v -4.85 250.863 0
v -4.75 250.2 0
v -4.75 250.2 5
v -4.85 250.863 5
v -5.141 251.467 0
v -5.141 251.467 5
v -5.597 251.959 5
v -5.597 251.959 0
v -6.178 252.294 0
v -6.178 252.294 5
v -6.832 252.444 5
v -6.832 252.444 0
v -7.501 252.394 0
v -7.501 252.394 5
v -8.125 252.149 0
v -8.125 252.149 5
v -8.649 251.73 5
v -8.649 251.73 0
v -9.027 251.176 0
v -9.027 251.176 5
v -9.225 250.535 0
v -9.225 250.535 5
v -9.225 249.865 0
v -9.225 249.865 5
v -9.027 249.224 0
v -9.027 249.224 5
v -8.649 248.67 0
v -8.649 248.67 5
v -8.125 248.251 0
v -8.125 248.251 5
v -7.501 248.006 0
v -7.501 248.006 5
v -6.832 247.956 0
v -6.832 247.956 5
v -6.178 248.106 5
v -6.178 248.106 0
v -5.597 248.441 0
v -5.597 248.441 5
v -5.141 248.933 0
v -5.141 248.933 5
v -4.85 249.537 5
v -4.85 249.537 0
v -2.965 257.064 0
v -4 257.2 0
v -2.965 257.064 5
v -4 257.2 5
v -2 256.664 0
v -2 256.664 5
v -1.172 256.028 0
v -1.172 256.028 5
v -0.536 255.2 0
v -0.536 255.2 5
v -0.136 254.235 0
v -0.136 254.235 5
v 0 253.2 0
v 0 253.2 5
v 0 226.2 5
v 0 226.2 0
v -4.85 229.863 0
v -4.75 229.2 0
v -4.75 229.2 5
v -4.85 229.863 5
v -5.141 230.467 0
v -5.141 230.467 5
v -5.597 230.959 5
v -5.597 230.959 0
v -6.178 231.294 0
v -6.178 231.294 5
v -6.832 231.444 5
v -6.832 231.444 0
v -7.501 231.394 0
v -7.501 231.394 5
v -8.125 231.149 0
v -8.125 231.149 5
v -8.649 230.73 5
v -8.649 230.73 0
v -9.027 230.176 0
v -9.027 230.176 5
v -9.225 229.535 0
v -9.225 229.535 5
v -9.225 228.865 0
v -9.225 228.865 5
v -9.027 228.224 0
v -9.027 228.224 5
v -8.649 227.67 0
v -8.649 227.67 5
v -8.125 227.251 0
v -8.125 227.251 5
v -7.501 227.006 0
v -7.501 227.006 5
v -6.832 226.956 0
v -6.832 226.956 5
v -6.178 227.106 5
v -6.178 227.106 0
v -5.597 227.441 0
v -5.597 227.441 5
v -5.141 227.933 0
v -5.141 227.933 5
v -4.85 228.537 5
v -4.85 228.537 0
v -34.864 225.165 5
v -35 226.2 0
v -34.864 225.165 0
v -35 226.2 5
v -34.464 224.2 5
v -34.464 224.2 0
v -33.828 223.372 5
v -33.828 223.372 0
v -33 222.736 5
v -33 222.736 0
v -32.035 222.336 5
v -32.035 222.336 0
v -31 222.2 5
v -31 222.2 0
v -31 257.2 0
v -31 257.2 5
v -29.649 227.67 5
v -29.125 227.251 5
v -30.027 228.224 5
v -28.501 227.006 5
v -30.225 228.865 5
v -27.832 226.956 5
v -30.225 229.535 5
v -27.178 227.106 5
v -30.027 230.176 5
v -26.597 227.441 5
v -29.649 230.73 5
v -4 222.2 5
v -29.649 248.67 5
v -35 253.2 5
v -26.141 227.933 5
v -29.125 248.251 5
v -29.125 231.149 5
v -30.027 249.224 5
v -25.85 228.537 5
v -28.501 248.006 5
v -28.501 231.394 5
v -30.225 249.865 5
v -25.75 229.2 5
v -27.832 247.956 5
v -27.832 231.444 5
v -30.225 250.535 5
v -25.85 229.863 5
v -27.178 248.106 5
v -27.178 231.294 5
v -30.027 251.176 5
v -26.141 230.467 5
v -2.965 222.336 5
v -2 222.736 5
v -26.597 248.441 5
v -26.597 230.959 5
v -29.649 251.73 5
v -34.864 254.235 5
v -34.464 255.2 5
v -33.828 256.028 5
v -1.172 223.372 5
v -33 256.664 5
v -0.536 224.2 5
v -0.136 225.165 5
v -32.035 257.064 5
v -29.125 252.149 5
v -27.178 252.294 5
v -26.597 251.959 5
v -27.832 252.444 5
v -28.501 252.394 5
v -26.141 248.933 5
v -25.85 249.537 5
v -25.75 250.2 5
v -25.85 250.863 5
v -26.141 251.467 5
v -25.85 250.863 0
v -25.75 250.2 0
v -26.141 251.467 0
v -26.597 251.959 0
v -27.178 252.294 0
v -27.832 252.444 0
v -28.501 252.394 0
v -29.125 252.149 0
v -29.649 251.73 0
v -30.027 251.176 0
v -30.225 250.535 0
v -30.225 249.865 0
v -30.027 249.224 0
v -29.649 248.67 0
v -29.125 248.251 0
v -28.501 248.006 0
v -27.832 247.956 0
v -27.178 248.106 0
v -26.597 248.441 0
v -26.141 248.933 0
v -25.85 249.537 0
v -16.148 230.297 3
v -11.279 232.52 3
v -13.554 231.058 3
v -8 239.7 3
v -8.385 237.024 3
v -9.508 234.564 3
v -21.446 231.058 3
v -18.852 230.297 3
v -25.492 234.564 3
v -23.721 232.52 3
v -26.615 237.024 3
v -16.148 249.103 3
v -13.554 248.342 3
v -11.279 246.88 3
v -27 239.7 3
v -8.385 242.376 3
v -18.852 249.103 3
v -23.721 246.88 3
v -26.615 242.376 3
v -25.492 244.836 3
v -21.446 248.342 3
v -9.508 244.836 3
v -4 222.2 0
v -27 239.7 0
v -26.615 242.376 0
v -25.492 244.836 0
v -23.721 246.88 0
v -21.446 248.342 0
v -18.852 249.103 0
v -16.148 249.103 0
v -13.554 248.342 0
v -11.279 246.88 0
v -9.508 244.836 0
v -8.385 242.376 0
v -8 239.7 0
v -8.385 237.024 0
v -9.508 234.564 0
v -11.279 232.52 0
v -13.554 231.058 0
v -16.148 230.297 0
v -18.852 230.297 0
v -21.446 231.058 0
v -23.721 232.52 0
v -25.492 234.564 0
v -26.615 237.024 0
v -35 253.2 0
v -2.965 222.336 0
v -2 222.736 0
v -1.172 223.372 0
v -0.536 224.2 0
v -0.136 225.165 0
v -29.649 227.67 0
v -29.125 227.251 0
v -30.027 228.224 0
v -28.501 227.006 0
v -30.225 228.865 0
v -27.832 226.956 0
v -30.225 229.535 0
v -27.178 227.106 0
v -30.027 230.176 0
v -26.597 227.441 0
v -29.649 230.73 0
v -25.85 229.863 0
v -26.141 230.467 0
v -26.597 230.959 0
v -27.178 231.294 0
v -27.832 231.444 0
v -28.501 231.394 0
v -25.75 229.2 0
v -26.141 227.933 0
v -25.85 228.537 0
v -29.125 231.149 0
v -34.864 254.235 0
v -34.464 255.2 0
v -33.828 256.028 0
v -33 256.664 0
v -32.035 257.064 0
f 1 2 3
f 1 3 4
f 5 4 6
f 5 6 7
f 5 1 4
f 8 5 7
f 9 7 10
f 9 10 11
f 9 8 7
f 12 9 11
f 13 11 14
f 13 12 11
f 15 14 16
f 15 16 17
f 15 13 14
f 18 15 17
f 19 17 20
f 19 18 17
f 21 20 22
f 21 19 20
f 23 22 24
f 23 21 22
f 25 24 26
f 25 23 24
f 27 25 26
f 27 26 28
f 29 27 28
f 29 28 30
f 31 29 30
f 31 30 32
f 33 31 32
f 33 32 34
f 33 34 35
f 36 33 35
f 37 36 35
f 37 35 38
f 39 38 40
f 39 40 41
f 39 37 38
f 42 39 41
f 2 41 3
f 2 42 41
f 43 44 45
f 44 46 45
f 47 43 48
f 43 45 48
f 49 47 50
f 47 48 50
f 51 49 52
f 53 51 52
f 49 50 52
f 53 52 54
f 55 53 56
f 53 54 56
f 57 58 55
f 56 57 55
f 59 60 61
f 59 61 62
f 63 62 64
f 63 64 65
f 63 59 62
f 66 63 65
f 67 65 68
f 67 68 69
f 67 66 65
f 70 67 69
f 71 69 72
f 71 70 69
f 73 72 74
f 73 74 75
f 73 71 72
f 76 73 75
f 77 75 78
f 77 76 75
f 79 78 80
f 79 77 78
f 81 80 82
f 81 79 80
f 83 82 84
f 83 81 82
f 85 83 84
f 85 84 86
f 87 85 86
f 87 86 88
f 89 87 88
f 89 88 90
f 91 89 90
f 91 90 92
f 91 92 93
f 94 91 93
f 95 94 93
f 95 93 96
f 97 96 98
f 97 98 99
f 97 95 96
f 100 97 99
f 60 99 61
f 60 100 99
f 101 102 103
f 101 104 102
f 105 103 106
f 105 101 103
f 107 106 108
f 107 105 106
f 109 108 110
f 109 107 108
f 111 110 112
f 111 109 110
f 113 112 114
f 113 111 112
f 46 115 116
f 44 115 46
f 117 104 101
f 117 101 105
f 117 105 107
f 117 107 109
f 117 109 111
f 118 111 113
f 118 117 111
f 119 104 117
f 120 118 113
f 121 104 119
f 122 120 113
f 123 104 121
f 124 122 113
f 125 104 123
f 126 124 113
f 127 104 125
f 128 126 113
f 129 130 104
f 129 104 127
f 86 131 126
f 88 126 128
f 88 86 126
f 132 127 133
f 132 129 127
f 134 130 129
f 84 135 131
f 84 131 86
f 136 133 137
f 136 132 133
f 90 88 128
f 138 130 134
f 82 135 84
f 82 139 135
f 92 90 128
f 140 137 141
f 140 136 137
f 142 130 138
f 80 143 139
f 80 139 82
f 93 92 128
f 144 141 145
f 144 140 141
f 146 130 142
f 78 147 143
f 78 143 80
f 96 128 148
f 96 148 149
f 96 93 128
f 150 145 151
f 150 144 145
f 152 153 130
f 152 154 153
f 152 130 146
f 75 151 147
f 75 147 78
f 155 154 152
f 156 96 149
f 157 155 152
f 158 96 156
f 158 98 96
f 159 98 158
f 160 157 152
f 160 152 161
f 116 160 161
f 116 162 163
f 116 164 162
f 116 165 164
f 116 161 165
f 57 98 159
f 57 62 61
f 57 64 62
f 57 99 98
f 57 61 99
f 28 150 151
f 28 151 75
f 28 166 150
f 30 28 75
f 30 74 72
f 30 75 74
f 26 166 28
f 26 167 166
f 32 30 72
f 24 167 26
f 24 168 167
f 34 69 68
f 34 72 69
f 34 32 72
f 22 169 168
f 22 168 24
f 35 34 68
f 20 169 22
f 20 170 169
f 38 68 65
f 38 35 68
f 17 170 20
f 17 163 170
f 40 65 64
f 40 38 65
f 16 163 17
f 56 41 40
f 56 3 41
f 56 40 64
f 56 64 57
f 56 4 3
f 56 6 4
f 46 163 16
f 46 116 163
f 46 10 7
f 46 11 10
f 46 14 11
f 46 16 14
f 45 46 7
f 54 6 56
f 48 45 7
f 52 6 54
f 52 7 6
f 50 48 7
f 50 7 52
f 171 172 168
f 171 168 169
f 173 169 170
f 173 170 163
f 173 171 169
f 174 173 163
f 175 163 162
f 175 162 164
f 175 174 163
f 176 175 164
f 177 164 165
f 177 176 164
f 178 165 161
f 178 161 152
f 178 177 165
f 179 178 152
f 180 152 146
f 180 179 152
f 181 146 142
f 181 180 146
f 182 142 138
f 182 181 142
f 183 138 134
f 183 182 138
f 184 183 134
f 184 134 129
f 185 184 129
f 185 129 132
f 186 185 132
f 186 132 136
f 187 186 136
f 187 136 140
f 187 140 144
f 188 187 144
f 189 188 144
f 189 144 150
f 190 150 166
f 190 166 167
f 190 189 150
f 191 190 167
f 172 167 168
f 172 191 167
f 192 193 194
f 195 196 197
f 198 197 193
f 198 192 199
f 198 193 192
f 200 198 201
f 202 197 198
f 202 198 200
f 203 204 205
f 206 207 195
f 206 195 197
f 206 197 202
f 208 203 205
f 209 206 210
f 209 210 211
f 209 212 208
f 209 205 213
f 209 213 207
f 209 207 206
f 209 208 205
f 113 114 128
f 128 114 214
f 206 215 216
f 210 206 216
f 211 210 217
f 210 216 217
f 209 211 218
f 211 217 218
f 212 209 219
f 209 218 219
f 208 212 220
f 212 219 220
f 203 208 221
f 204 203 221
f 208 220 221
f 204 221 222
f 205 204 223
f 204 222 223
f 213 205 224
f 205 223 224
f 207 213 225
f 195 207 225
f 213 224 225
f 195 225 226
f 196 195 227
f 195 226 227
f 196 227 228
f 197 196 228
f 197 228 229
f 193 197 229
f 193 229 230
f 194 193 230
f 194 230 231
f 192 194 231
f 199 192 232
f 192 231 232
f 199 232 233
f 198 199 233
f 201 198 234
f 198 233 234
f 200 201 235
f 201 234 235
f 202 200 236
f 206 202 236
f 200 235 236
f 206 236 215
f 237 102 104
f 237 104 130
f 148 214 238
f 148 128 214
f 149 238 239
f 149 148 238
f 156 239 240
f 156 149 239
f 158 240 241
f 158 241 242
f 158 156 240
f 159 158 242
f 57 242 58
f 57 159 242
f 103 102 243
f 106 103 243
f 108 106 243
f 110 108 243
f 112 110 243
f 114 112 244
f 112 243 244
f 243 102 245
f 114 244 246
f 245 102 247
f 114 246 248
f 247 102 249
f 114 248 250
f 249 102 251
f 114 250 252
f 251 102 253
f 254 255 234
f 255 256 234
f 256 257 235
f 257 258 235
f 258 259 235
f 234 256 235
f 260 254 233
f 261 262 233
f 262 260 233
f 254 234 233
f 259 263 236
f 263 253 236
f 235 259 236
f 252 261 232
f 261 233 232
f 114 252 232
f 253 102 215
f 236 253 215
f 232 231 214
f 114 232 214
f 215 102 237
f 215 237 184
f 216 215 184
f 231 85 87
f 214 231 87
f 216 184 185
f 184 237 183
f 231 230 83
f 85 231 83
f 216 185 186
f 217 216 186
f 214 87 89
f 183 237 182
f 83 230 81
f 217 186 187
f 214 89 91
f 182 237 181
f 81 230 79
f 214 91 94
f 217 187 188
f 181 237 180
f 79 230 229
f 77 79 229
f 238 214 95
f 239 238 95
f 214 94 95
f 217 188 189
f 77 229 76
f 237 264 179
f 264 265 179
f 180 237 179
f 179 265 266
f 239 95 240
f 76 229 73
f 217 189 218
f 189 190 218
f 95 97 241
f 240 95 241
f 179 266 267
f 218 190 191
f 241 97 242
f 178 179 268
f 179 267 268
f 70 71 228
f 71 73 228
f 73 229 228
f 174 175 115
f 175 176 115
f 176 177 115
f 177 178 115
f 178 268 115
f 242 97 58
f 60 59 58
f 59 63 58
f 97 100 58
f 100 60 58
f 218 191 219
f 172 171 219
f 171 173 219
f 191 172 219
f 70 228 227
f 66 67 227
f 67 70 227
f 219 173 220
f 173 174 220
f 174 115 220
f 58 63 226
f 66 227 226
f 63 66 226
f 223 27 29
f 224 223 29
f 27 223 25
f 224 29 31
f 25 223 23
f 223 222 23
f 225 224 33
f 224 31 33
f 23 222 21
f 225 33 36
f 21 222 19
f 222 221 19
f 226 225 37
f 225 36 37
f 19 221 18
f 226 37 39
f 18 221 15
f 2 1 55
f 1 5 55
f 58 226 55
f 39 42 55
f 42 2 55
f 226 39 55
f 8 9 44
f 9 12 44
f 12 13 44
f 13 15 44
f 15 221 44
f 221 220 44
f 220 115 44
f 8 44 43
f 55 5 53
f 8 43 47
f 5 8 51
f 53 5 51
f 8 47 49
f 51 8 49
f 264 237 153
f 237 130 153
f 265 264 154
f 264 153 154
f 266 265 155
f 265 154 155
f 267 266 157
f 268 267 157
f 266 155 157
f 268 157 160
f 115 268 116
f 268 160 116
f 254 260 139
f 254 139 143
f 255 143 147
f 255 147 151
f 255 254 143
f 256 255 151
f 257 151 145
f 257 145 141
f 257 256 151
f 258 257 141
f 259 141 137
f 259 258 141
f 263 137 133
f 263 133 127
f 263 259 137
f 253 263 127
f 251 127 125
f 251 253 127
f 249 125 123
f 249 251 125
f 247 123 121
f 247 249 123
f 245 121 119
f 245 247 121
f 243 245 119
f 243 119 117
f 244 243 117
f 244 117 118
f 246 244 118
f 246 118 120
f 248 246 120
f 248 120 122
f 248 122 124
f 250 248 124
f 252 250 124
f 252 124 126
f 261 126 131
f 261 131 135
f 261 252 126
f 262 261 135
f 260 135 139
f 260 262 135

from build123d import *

# Parameters (mm, degrees)
SKETCH1_W           = 35
SKETCH1_H           = 35
SKETCH1_R           = 2.25
BOSS_EXTRUDE1_DEPTH = 5
FILLET1_R           = 4
SKETCH2_R           = 9.5
CUT_EXTRUDE1_DEPTH  = 3


with BuildPart() as part:
    # Sketch1 → Boss-Extrude1 (new body)
    with BuildSketch(Plane.XY):
        with Locations((-17.5, 239.7)):
            Rectangle(SKETCH1_W, SKETCH1_H)
        with Locations((-7, 250.2)):
            Circle(SKETCH1_R, mode=Mode.SUBTRACT)
        with Locations((-7, 229.2)):
            Circle(SKETCH1_R, mode=Mode.SUBTRACT)
        with Locations((-28, 229.2)):
            Circle(SKETCH1_R, mode=Mode.SUBTRACT)
        with Locations((-28, 250.2)):
            Circle(SKETCH1_R, mode=Mode.SUBTRACT)
    extrude(amount=BOSS_EXTRUDE1_DEPTH)

    # Fillet1
    fillet1_edges = [part.edges().sort_by_distance(p)[0] for p in [
        (0, 222.2, 2.5),
        (-35, 222.2, 2.5),
        (-35, 257.2, 2.5),
        (0, 257.2, 2.5),
    ]]
    fillet(fillet1_edges, radius=FILLET1_R)

    # Sketch2 → Cut-Extrude1 (cut)
    with BuildSketch(Plane(origin=(0, 0, 0), x_dir=(-1, 0, 0), z_dir=(0, 0, -1))):
        with Locations((17.5, 239.7)):
            Circle(SKETCH2_R)
    extrude(amount=-CUT_EXTRUDE1_DEPTH, mode=Mode.SUBTRACT)


solid = part.part
